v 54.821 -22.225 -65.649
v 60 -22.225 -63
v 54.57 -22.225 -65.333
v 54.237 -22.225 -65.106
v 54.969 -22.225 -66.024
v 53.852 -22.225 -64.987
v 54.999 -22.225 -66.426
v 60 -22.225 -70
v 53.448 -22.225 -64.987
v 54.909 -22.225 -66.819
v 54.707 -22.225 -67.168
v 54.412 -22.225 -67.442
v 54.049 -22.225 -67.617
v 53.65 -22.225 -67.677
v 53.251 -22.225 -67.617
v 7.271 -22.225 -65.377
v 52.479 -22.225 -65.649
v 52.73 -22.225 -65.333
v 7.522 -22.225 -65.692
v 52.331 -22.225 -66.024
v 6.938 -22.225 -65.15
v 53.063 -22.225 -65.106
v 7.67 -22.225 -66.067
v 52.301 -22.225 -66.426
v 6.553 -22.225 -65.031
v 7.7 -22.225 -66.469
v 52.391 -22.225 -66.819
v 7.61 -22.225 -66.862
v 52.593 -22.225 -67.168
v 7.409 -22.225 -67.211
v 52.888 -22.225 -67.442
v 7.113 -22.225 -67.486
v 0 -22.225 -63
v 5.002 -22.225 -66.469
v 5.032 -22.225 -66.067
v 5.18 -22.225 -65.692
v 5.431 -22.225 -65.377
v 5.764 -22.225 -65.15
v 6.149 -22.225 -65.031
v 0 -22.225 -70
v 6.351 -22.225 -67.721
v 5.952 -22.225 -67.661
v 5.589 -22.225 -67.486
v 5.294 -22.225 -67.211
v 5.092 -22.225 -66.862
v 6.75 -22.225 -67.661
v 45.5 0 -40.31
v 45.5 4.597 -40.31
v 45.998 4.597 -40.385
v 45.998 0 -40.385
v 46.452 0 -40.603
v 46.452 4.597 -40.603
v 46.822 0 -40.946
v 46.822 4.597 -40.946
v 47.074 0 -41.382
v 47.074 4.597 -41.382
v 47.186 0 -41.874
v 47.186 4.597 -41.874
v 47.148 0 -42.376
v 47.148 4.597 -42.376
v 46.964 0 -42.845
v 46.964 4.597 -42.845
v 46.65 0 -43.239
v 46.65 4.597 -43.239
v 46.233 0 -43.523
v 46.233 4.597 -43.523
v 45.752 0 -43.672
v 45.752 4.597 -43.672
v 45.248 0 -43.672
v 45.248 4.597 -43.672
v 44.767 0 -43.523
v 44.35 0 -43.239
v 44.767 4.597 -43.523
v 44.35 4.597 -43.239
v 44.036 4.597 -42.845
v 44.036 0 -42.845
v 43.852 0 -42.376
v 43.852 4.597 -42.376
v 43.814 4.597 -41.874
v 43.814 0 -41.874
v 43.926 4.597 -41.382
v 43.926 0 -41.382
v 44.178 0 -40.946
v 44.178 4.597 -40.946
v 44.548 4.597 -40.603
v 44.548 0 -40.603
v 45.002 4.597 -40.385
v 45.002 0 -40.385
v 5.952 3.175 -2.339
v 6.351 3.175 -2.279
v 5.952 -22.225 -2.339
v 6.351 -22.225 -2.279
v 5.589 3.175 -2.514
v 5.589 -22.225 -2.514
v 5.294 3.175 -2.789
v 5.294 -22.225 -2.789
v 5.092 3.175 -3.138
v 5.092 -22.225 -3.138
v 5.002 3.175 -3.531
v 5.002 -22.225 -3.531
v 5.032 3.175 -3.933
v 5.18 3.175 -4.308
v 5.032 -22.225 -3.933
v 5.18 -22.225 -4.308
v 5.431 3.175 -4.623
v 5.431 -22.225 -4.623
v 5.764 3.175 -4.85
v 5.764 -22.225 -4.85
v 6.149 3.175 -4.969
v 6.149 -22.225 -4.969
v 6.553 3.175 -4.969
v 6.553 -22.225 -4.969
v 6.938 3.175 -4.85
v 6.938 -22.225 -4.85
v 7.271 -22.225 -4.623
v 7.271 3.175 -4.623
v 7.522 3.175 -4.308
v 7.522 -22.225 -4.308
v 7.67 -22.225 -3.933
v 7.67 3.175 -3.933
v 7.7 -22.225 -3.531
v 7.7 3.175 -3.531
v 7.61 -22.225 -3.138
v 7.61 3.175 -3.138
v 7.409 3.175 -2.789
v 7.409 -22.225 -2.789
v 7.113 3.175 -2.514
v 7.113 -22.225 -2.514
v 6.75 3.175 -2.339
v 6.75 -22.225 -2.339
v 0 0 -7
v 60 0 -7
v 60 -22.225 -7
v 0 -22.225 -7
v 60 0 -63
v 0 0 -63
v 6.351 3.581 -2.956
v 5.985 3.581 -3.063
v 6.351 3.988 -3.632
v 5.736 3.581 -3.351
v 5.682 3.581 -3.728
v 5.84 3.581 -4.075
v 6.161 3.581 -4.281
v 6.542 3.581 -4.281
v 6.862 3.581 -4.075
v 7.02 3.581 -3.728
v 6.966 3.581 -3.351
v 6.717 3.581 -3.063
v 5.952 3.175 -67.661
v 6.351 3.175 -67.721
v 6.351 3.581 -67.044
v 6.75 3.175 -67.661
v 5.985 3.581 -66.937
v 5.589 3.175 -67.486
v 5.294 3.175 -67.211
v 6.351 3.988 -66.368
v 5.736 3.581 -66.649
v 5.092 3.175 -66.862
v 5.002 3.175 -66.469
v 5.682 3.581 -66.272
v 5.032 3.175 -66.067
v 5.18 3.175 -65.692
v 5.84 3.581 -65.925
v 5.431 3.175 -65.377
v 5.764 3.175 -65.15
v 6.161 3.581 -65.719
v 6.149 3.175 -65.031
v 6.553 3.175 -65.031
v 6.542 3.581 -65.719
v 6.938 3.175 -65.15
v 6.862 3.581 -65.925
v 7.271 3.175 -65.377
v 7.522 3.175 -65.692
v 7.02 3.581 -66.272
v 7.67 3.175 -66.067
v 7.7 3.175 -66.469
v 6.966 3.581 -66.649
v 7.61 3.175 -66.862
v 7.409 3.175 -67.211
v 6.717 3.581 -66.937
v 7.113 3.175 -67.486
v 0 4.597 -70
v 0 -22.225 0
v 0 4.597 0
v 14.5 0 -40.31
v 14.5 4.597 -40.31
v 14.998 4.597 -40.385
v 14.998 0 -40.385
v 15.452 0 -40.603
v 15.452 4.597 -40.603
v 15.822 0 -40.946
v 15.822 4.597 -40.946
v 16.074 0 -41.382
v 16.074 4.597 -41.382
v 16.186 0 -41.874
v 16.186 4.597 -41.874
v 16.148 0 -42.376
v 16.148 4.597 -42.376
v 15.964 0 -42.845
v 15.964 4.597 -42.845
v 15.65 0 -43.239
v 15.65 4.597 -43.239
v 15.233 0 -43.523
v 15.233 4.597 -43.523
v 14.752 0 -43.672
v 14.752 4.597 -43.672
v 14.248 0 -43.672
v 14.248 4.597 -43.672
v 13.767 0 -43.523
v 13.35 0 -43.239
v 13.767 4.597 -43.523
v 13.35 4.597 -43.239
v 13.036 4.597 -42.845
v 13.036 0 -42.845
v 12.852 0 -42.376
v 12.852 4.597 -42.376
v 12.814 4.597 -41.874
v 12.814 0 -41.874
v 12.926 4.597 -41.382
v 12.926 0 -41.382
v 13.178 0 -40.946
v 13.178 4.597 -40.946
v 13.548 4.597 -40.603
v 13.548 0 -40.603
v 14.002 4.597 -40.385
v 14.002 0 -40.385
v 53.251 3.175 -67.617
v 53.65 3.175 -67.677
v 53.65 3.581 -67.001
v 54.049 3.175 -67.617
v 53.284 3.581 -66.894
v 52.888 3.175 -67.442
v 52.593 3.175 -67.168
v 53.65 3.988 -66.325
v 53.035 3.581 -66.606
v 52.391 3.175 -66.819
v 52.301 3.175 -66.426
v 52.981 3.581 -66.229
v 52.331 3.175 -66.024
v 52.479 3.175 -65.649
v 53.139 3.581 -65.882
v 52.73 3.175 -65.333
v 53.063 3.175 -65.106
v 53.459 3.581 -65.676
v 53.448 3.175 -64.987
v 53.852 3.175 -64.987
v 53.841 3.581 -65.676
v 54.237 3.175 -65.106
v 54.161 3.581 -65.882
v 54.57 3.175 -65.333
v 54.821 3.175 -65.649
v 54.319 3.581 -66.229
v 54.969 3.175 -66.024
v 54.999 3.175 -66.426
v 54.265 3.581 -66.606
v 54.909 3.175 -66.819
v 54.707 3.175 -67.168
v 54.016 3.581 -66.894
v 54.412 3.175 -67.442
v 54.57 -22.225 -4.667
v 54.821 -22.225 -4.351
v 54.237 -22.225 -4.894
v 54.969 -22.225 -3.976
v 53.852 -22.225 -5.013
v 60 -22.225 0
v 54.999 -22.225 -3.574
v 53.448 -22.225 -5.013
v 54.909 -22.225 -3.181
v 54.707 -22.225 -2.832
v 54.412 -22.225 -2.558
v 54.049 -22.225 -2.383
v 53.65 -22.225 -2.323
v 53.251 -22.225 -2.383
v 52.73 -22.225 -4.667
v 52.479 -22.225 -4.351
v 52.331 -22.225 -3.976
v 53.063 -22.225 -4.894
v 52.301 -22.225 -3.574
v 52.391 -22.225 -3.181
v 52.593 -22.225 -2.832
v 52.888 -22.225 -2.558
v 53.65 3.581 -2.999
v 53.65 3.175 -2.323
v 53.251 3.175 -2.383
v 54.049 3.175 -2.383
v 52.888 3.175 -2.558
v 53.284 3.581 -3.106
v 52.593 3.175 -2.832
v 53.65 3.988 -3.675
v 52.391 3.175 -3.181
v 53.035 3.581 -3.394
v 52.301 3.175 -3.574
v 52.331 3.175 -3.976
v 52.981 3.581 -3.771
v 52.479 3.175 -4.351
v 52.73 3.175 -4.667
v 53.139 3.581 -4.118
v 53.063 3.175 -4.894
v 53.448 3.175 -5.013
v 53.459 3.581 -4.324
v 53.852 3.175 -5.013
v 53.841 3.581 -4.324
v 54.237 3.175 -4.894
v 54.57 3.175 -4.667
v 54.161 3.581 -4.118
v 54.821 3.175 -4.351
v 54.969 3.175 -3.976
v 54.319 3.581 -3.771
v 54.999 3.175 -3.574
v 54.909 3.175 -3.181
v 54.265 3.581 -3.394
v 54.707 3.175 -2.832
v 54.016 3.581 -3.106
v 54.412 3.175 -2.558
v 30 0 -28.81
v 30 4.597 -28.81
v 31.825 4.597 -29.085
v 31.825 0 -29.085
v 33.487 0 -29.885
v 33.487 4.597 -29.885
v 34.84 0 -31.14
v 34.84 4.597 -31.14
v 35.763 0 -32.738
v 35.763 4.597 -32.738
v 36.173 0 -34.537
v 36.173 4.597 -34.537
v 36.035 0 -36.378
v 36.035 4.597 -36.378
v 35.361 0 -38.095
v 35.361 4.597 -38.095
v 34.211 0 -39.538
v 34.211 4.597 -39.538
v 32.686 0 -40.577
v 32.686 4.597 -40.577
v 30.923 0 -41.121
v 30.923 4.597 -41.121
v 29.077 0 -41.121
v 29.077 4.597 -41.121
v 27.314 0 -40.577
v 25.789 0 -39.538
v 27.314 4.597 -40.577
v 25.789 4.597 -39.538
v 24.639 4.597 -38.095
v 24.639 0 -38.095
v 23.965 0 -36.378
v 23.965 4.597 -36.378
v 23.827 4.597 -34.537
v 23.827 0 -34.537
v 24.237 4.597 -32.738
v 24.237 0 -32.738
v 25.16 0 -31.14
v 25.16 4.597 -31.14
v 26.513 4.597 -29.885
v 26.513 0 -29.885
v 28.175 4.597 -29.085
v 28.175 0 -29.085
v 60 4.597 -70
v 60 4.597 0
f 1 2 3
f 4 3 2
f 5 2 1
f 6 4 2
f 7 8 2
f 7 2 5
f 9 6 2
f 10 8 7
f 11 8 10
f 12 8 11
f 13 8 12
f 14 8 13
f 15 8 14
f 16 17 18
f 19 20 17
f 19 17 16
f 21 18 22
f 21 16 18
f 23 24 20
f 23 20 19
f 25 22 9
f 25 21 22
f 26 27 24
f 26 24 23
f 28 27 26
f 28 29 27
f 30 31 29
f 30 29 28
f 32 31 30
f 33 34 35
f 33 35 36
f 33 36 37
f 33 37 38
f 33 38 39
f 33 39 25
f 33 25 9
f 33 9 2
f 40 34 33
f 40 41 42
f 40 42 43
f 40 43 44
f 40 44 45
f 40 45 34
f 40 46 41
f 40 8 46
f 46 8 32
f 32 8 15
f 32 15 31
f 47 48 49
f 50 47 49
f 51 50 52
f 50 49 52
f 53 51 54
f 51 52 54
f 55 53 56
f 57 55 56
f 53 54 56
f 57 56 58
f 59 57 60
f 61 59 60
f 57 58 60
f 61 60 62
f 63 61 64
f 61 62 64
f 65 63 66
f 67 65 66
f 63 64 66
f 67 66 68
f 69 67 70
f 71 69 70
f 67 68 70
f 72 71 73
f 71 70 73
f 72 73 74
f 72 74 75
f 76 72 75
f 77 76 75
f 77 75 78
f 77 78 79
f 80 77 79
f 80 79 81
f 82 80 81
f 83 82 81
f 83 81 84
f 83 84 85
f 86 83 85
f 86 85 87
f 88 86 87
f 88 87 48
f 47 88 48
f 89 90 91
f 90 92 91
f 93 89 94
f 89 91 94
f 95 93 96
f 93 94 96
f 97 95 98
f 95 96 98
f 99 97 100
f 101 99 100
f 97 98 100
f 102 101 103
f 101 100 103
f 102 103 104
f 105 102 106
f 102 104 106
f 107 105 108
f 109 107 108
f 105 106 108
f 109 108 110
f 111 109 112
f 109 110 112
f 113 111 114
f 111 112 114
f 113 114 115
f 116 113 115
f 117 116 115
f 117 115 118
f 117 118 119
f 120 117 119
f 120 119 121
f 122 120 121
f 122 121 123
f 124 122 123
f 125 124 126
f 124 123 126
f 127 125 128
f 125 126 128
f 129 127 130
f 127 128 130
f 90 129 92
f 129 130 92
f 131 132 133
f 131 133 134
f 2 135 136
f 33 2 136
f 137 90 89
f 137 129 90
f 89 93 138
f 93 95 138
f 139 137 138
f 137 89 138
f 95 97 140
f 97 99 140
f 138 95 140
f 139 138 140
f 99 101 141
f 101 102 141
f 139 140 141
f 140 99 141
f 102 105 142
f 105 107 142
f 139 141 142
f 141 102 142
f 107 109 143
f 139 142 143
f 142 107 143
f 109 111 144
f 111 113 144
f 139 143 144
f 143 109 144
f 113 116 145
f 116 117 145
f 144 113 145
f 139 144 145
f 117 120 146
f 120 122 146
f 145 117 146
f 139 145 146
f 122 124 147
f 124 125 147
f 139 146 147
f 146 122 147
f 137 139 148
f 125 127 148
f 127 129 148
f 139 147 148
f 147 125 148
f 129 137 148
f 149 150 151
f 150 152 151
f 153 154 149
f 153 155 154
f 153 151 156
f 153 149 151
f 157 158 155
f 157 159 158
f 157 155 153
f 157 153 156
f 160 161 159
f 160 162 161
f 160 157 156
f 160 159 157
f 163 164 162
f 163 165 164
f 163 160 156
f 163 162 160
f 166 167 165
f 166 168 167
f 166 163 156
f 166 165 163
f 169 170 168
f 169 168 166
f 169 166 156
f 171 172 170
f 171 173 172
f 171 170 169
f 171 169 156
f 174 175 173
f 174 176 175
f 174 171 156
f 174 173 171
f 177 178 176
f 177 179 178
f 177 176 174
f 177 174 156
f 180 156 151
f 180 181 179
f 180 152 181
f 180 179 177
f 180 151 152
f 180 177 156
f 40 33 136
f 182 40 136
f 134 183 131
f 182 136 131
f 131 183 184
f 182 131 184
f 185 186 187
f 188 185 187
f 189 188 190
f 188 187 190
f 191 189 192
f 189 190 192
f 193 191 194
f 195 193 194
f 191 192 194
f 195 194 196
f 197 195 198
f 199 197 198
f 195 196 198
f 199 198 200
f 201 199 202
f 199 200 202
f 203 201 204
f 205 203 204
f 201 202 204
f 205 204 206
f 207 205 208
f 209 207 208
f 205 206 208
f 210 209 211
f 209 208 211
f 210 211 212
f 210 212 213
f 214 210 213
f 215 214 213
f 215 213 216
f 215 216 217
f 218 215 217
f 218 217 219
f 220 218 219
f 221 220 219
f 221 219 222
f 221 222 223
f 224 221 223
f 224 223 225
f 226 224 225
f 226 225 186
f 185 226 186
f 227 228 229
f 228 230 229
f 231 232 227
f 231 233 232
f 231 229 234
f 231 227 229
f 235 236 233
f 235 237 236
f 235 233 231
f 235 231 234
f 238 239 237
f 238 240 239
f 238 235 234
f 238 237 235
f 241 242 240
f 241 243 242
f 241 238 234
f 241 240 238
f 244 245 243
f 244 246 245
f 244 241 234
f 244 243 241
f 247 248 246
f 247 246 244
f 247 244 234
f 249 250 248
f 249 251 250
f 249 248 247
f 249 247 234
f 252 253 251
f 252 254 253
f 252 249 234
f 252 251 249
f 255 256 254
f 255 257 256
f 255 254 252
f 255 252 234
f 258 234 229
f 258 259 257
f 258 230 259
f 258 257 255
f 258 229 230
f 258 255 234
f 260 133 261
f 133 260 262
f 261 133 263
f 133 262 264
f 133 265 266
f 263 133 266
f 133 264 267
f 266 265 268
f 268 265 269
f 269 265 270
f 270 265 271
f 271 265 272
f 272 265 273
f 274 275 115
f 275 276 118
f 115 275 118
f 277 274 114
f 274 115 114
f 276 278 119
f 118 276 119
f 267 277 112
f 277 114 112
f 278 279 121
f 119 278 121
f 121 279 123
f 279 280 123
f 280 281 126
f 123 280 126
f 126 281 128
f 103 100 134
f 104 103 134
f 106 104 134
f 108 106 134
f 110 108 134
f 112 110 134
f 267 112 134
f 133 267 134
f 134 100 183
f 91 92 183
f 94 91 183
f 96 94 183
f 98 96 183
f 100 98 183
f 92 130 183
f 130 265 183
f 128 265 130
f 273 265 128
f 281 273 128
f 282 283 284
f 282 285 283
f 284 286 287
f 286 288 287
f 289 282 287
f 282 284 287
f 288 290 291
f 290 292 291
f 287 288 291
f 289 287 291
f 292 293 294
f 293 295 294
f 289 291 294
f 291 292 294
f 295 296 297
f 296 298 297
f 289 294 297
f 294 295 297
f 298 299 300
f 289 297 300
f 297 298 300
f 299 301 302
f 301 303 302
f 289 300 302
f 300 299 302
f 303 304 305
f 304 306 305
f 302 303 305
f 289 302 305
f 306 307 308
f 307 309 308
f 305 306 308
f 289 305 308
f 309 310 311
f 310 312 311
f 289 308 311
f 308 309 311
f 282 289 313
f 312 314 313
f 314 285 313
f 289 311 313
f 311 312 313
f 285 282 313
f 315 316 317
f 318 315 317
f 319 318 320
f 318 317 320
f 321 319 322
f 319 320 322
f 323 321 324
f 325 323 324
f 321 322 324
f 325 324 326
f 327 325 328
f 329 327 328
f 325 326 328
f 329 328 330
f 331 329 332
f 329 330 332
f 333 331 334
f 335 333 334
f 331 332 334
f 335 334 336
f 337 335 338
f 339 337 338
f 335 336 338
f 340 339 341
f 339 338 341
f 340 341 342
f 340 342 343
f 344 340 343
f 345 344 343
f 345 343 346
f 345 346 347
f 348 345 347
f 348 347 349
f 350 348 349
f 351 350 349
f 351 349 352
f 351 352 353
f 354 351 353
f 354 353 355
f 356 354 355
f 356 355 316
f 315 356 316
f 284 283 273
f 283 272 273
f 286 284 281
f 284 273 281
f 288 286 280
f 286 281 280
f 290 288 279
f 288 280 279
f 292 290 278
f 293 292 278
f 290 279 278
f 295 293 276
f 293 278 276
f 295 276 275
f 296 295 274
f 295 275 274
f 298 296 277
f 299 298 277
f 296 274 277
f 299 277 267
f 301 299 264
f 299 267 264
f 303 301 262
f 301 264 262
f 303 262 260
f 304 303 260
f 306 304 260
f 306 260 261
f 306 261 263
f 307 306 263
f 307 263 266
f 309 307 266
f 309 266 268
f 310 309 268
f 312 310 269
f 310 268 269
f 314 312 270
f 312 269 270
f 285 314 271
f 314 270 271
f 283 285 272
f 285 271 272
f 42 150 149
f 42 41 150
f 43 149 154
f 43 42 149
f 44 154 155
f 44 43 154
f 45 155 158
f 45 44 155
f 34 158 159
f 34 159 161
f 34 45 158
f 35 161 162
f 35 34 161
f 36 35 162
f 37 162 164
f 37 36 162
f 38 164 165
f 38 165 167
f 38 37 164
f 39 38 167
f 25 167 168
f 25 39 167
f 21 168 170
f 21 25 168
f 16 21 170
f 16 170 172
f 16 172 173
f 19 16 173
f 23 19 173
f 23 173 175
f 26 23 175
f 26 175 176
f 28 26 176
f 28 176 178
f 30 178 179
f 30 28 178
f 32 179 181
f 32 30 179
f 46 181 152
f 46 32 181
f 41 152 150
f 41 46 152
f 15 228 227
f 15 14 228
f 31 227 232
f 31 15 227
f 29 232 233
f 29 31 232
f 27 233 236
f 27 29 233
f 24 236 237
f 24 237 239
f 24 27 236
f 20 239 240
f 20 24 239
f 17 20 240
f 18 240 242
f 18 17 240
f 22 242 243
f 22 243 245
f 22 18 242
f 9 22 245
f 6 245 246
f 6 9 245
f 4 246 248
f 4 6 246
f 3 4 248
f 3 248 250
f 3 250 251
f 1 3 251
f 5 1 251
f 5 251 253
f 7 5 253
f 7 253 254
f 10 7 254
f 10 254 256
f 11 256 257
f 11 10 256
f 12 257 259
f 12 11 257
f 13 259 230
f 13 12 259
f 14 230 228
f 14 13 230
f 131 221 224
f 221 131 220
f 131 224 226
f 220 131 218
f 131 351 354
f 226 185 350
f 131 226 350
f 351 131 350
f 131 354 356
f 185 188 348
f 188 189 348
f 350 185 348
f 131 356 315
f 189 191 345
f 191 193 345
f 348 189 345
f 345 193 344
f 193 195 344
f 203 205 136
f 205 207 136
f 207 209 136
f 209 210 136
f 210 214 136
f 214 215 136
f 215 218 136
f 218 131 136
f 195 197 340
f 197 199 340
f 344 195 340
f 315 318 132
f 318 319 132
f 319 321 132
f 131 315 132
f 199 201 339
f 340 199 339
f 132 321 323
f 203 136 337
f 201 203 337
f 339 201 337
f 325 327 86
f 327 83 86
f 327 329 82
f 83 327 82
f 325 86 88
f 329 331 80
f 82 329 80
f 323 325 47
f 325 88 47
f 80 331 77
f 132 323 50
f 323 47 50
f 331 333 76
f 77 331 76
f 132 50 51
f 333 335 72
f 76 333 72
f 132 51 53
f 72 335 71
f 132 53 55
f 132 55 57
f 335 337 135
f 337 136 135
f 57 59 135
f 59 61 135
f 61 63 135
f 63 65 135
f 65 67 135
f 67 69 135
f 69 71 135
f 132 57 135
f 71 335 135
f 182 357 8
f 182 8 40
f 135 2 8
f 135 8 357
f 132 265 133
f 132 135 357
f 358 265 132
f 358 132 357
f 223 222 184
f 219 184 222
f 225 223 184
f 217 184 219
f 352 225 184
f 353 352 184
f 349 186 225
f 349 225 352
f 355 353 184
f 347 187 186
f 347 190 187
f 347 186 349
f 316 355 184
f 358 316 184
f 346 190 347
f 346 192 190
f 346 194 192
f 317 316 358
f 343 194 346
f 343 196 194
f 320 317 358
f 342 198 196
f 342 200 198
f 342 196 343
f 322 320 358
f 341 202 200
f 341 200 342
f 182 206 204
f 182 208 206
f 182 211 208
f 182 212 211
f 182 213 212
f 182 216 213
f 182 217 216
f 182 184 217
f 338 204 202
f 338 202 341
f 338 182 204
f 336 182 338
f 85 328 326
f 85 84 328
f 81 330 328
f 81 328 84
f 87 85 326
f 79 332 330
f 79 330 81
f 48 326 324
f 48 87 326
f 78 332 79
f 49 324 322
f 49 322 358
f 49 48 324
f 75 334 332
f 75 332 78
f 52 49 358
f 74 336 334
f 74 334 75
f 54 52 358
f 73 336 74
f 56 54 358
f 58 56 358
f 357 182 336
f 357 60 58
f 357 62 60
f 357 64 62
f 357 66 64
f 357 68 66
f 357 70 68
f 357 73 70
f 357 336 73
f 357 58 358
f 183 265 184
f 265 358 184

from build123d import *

# Parameters (mm, degrees)
SKETCH2_W                      = 60
SKETCH2_H                      = 70
BOSS_EXTRUDE1_DEPTH            = 4.5974
SKETCH4_R                      = 6.1905
SKETCH4_R_2                    = 1.6905
CUT_EXTRUDE1_DEPTH             = 93.309999928
SKETCH5_W                      = 60
SKETCH5_H                      = 22.225
BOSS_EXTRUDE2_DEPTH            = 7
F_6_32_TAPPED_HOLE1_AT_2_COUNT = 2
F_6_32_TAPPED_HOLE1_AT_2_PITCH = 47.298975859


with BuildPart() as part:
    # Sketch2 → Boss-Extrude1 (new body)
    with BuildSketch(Plane(origin=(0, 0, 0), x_dir=(1, 0, 0), z_dir=(0, 1, 0))):
        with Locations((30, 35)):
            Rectangle(SKETCH2_W, SKETCH2_H)
    extrude(amount=BOSS_EXTRUDE1_DEPTH)

    # Sketch4 → Cut-Extrude1 (cut, through all)
    with BuildSketch(Plane(origin=(0, 4.5974, 0), x_dir=(1, 0, 0), z_dir=(0, 1, 0))):
        with Locations(Location((30, 35, 0), (0, 0, 270))):
            Circle(SKETCH4_R)
        with Locations(Location((45.5, 42, 0), (0, 0, 270))):
            Circle(SKETCH4_R_2)
        with Locations(Location((14.5, 42, 0), (0, 0, 270))):
            Circle(SKETCH4_R_2)
    extrude(amount=-CUT_EXTRUDE1_DEPTH, mode=Mode.SUBTRACT)

    # Sketch5 → Boss-Extrude2 (add)
    with BuildSketch(Plane(origin=(0, 0, -70), x_dir=(-1, 0, 0), z_dir=(0, 0, -1))):
        with Locations((-30, -11.1125)):
            Rectangle(SKETCH5_W, SKETCH5_H)
    boss_extrude2 = extrude(amount=-BOSS_EXTRUDE2_DEPTH)

    # Sketch8 → #6-32 Tapped Hole1 (revolve, cut)
    with BuildSketch(Plane(origin=(6.35104386, -22.225, -66.368109228), x_dir=(0, 0, -1), z_dir=(1, 0, 0))):
        Polygon((0, 0), (0, 26.21269403), (1.35255, 25.4), (1.35255, 0), align=None)
    f_6_32_tapped_hole1 = revolve(axis=Axis((6.35104386, -28.575, -66.368109228), (0, 1, 0)), mode=Mode.SUBTRACT)

    # #6-32 Tapped Hole1 at 2: #6-32 Tapped Hole1 ×2
    with Locations(*[Vector(0.9999995830982151, 0, 0.0009131283567521887) * (i * F_6_32_TAPPED_HOLE1_AT_2_PITCH) for i in range(1, F_6_32_TAPPED_HOLE1_AT_2_COUNT)]):
        add(f_6_32_tapped_hole1, mode=Mode.SUBTRACT)

    # Mirror1: Boss-Extrude2, #6-32 Tapped Hole1 across plane
    add(boss_extrude2.mirror(Plane(origin=(0, 0, -35), x_dir=(1, 0, 0), z_dir=(0, 0, -1))))
    add(f_6_32_tapped_hole1.mirror(Plane(origin=(0, 0, -35), x_dir=(1, 0, 0), z_dir=(0, 0, -1))), mode=Mode.SUBTRACT)

    # Mirror1 copy 1 sketch → Mirror1 copy 1 (revolve, cut)
    with BuildSketch(Plane(origin=(53.65, -22.225, -3.675080808), x_dir=(0, 0, 1), z_dir=(1, 0, 0))):
        Polygon((0, 0), (0, -26.21269403), (1.35255, -25.4), (1.35255, 0), align=None)
    revolve(axis=Axis((53.65, -28.575, -3.675080808), (0, -1, 0)), mode=Mode.SUBTRACT)


solid = part.part
